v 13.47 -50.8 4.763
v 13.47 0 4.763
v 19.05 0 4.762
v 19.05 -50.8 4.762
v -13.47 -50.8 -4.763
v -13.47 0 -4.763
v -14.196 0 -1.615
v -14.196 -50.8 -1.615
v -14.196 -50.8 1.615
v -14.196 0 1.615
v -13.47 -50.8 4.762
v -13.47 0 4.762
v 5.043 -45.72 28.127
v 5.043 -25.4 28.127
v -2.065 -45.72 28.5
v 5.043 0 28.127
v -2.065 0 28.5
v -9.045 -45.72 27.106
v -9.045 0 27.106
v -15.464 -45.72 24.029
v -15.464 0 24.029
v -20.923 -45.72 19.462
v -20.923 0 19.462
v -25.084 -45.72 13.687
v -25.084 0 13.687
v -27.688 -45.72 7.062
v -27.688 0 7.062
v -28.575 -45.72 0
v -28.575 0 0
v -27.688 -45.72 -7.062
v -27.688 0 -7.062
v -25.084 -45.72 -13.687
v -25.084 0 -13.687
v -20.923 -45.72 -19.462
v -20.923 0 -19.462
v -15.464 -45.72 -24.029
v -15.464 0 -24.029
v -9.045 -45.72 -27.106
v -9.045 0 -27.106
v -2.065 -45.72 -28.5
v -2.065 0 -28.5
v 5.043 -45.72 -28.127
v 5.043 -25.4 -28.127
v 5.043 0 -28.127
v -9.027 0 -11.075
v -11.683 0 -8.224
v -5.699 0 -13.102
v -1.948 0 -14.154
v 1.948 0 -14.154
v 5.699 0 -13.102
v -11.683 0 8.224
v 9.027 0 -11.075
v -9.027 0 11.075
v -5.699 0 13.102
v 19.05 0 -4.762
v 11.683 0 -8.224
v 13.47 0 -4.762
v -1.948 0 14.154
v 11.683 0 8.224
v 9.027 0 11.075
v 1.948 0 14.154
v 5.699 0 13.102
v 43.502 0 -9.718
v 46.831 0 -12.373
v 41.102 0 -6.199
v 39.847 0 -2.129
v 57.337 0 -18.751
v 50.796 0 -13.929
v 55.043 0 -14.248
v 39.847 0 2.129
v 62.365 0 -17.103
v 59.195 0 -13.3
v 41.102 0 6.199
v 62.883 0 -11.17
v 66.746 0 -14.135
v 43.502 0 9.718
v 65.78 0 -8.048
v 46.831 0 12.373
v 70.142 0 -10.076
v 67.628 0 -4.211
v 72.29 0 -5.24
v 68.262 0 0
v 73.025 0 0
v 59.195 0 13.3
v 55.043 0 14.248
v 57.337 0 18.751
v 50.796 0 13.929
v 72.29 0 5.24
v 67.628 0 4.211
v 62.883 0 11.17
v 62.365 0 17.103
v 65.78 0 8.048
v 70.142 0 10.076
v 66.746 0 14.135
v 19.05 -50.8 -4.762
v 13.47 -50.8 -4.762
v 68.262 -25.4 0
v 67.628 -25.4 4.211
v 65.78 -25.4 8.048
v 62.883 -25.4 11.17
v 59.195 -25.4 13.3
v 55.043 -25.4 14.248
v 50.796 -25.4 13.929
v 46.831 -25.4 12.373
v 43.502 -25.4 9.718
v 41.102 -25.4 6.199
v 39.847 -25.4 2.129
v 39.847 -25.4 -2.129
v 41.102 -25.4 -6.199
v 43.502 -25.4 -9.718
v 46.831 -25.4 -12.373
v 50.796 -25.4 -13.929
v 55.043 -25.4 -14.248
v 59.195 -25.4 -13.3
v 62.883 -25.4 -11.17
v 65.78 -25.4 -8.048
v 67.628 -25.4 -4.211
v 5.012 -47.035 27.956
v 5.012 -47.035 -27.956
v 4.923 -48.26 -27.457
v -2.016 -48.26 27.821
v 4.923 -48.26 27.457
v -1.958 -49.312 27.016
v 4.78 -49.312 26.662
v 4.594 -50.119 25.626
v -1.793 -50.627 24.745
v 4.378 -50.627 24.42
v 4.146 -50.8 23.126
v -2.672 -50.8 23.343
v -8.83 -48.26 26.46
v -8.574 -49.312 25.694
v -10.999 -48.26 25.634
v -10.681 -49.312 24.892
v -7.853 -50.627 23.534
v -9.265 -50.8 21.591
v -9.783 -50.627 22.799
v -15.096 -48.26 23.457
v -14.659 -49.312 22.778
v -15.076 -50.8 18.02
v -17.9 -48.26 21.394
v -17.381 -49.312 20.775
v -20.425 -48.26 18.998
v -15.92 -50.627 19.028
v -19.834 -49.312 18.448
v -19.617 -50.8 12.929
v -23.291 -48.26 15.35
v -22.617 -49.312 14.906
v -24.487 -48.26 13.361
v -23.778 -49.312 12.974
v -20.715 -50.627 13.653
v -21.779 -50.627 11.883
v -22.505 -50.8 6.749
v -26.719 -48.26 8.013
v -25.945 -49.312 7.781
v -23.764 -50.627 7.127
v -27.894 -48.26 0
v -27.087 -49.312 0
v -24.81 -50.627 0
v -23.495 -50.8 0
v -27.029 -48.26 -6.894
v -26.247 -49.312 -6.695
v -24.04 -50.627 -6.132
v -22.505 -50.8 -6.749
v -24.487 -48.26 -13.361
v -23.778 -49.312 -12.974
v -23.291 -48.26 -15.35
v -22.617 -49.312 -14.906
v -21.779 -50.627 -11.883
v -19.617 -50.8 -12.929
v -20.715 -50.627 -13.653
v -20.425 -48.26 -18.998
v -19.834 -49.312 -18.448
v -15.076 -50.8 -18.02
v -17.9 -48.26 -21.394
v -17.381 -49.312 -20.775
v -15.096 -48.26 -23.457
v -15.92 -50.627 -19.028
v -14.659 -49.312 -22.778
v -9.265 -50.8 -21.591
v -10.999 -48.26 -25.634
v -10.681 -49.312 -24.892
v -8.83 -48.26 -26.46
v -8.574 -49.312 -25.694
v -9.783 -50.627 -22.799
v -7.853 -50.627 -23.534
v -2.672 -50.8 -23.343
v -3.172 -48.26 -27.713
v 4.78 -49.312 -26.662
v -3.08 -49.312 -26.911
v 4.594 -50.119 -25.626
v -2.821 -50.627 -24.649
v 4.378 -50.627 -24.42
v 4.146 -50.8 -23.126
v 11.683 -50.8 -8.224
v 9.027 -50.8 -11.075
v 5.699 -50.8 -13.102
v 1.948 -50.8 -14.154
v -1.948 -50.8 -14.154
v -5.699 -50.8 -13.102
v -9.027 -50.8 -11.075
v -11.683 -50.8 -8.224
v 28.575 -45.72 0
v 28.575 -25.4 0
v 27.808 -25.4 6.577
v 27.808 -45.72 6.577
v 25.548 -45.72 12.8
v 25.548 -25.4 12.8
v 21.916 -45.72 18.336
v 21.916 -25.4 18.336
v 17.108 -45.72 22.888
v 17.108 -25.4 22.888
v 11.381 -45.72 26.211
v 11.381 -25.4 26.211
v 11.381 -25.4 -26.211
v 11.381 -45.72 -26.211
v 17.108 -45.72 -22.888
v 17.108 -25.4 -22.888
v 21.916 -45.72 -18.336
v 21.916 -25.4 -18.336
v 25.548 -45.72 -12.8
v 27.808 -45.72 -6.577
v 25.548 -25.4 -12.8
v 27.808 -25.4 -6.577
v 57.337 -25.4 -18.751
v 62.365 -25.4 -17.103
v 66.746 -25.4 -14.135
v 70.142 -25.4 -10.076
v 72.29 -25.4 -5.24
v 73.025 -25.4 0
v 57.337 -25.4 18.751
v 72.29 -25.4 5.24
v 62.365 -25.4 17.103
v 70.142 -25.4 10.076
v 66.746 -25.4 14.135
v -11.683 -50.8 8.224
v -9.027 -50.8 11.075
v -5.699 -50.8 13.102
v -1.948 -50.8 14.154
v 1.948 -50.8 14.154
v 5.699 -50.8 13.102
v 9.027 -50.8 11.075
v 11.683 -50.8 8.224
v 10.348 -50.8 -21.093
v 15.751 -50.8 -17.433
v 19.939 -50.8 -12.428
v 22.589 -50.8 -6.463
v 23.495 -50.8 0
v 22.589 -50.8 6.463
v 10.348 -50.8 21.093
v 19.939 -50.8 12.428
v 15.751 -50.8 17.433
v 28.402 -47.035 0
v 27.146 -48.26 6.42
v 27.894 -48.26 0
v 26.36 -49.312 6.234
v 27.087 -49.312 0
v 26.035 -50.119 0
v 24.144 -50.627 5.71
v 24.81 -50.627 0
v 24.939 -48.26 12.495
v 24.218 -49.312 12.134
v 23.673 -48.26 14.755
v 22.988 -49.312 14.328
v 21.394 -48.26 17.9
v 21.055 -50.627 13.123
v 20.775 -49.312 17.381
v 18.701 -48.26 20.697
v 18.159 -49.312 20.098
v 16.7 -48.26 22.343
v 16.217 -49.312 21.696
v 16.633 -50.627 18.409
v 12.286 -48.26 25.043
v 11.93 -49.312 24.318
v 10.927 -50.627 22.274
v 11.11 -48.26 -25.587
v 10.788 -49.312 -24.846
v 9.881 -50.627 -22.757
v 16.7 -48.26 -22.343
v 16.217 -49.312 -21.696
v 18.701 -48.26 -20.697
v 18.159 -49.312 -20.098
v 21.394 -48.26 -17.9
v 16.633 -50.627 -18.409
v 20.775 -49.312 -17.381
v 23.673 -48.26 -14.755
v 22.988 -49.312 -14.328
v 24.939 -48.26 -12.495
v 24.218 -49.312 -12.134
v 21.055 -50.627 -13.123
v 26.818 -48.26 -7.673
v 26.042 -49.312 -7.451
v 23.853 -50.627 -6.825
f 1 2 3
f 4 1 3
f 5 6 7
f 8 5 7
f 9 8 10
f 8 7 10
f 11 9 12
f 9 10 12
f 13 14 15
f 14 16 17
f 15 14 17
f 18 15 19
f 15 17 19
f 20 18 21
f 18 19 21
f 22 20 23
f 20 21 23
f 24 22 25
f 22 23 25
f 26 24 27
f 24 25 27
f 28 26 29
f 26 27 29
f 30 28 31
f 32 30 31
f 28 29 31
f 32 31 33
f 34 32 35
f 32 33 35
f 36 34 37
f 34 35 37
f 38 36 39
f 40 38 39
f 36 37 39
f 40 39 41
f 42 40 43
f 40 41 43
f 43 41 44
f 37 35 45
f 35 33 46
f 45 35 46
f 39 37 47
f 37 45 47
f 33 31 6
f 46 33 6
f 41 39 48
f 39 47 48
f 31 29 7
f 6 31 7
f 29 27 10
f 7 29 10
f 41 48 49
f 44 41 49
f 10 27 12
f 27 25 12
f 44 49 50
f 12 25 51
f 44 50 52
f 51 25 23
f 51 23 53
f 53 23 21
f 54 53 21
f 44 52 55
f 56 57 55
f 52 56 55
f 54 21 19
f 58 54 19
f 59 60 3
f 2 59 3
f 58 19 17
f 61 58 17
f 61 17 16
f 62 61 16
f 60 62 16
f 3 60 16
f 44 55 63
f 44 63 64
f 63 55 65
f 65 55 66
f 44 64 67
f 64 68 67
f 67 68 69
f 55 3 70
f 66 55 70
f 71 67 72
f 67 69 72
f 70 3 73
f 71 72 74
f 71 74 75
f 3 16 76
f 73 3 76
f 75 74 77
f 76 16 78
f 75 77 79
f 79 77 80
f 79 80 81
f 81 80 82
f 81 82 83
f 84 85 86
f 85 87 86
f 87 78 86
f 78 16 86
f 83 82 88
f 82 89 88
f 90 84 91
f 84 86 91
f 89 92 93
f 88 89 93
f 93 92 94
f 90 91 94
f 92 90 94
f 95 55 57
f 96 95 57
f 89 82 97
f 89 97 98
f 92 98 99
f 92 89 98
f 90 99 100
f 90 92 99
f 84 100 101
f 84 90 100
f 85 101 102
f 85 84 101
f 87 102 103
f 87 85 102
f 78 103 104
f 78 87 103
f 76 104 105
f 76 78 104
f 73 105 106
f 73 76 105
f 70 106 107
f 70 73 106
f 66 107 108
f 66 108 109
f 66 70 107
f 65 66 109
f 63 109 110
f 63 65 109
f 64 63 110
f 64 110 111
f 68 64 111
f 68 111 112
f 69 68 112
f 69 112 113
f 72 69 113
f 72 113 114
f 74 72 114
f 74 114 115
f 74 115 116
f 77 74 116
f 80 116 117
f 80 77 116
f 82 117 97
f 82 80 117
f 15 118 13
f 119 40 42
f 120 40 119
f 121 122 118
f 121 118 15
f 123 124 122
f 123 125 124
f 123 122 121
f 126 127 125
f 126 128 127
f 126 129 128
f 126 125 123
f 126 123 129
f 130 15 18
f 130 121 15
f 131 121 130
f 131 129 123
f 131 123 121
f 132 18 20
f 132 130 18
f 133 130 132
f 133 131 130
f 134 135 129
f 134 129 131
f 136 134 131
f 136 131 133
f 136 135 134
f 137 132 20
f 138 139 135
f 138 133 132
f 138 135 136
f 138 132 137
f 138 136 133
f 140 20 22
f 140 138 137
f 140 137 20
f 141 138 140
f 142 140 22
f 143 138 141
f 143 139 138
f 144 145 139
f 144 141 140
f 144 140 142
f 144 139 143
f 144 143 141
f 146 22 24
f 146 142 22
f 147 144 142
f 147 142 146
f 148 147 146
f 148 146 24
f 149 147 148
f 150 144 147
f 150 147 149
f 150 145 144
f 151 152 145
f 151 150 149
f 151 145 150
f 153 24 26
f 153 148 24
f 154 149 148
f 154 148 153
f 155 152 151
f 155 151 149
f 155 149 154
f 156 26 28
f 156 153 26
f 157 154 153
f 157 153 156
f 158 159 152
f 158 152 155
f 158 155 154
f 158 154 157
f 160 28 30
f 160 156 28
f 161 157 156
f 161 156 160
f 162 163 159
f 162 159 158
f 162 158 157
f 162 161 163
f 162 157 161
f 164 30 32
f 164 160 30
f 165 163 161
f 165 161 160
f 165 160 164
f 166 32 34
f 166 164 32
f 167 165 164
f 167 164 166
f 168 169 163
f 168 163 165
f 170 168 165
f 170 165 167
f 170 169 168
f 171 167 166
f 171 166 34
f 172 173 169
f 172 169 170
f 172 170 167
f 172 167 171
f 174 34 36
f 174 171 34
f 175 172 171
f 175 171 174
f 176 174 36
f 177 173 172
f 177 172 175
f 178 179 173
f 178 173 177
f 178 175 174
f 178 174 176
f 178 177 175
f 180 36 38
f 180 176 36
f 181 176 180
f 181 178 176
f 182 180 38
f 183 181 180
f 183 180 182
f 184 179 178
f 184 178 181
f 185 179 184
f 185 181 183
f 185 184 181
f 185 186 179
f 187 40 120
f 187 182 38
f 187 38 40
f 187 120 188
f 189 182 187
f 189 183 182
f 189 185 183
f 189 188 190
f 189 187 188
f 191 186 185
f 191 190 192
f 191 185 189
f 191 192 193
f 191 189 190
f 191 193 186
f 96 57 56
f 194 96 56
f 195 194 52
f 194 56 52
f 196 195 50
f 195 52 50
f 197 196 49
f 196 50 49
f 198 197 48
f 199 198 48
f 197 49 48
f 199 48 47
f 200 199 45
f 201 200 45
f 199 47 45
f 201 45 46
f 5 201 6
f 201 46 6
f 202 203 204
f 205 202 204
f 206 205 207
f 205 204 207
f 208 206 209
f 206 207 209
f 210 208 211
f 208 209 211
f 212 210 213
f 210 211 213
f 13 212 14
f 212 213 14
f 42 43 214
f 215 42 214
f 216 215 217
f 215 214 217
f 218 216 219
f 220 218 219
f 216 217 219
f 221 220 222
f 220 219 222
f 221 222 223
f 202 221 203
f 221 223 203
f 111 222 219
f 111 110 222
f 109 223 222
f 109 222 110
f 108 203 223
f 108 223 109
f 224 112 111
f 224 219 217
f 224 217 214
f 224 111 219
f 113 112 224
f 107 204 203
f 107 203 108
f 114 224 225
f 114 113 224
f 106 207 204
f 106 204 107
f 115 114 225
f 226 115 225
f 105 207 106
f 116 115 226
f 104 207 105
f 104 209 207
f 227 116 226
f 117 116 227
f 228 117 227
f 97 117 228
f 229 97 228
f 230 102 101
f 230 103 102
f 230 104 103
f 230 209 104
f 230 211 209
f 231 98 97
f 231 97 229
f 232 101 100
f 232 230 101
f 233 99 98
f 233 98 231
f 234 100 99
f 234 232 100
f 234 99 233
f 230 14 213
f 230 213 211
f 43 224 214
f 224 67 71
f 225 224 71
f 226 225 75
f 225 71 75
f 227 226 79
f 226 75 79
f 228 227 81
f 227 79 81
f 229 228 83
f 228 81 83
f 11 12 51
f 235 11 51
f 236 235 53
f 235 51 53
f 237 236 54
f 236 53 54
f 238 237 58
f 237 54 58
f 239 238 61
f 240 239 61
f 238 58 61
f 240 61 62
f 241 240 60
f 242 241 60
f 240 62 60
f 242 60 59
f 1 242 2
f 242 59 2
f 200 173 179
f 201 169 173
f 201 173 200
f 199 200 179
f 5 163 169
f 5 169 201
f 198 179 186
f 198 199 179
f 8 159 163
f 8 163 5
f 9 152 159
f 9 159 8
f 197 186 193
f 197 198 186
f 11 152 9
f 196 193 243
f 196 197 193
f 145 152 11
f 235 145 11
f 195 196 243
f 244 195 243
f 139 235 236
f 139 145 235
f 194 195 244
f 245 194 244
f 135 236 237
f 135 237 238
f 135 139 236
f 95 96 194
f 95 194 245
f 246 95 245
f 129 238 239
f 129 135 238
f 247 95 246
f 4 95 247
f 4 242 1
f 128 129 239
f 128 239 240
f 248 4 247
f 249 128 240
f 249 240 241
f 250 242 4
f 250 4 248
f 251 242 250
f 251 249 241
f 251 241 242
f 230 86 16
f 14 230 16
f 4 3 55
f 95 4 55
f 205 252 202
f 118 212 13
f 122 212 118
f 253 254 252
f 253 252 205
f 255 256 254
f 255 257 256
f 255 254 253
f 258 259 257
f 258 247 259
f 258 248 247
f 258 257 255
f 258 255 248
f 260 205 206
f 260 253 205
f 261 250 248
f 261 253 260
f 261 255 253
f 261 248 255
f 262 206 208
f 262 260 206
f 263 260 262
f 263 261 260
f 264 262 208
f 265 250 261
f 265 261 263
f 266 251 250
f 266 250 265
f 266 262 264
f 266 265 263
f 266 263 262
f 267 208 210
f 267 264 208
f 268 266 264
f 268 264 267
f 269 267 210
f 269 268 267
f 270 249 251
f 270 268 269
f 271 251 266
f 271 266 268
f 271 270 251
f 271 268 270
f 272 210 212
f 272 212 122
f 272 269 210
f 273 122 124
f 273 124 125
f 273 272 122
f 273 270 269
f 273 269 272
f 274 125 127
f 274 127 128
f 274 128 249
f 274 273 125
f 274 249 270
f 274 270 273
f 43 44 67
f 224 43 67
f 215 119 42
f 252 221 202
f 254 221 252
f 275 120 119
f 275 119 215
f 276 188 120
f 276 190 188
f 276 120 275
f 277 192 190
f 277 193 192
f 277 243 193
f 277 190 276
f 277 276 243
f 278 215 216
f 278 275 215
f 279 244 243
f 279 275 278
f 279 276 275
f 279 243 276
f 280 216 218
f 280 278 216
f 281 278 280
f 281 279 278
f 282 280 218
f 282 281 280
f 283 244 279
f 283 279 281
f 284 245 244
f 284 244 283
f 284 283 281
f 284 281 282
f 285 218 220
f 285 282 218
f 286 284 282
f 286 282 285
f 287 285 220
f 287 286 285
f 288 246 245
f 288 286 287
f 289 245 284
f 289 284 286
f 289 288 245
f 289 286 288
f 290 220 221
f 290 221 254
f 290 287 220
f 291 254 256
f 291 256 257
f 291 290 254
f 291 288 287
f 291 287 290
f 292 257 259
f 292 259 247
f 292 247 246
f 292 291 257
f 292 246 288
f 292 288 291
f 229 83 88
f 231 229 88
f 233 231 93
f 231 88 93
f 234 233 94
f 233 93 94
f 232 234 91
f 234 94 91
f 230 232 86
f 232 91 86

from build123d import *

# Parameters (mm, degrees)
F0_R     = 14.2875
F1_DEPTH = 25.4
F2_DEPTH = 50.8
F3_R     = 5.08


with BuildPart() as f1:
    # F0 (on Front) → F1 (new body)
    with BuildSketch(Plane.XZ):
        with BuildLine():
            ThreePointArc((5.042647, -28.126541), (21.916025, -18.336262), (28.575, 0))
            ThreePointArc((28.575, 0), (21.916025, 18.336262), (5.042647, 28.126541))
            ThreePointArc((5.042647, 28.126541), (-28.575, 0), (5.042647, -28.126541))
        make_face()
        with BuildLine():
            ThreePointArc((-13.470384, 4.7625), (0, 14.2875), (13.470384, 4.7625))
            Line((13.470384, 4.7625), (19.05, 4.7625))
            Line((19.05, 4.7625), (19.05, -4.7625))
            Line((19.05, -4.7625), (13.470384, -4.7625))
            ThreePointArc((13.470384, -4.7625), (0, -14.2875), (-13.470384, -4.7625))
            Line((-13.470384, -4.7625), (-19.05, -4.7625))
            Line((-19.05, -4.7625), (-19.05, 4.7625))
            Line((-19.05, 4.7625), (-13.470384, 4.7625))
        make_face(mode=Mode.SUBTRACT)
        with BuildLine():
            ThreePointArc((-13.470384, -4.7625), (-14.2875, 0), (-13.470384, 4.7625))
            Line((-13.470384, 4.7625), (-19.05, 4.7625))
            Line((-19.05, 4.7625), (-19.05, -4.7625))
            Line((-19.05, -4.7625), (-13.470384, -4.7625))
        make_face()
        with BuildLine():
            ThreePointArc((5.042647, 28.126541), (21.916025, 18.336262), (28.575, 0))
            ThreePointArc((28.575, 0), (21.916025, -18.336262), (5.042647, -28.126541))
            Line((5.042647, -28.126541), (57.336765, -18.751028))
            ThreePointArc((57.336765, -18.751028), (34.925, 0), (57.336765, 18.751028))
            Line((57.336765, 18.751028), (5.042647, 28.126541))
        make_face()
        with BuildLine():
            ThreePointArc((73.025, 0), (68.585683, 12.224174), (57.336765, 18.751028))
            ThreePointArc((57.336765, 18.751028), (34.925, 0), (57.336765, -18.751028))
            ThreePointArc((57.336765, -18.751028), (68.585683, -12.224174), (73.025, 0))
        make_face()
        with Locations((53.975, 0)):
            Circle(F0_R, mode=Mode.SUBTRACT)
    extrude(amount=F1_DEPTH)

    # F0 (on Front) → F2 (join)
    with BuildSketch(Plane.XZ):
        with BuildLine():
            ThreePointArc((5.042647, -28.126541), (21.916025, -18.336262), (28.575, 0))
            ThreePointArc((28.575, 0), (21.916025, 18.336262), (5.042647, 28.126541))
            ThreePointArc((5.042647, 28.126541), (-28.575, 0), (5.042647, -28.126541))
        make_face()
        with BuildLine():
            ThreePointArc((-13.470384, 4.7625), (0, 14.2875), (13.470384, 4.7625))
            Line((13.470384, 4.7625), (19.05, 4.7625))
            Line((19.05, 4.7625), (19.05, -4.7625))
            Line((19.05, -4.7625), (13.470384, -4.7625))
            ThreePointArc((13.470384, -4.7625), (0, -14.2875), (-13.470384, -4.7625))
            Line((-13.470384, -4.7625), (-19.05, -4.7625))
            Line((-19.05, -4.7625), (-19.05, 4.7625))
            Line((-19.05, 4.7625), (-13.470384, 4.7625))
        make_face(mode=Mode.SUBTRACT)
        with BuildLine():
            ThreePointArc((-13.470384, -4.7625), (-14.2875, 0), (-13.470384, 4.7625))
            Line((-13.470384, 4.7625), (-19.05, 4.7625))
            Line((-19.05, 4.7625), (-19.05, -4.7625))
            Line((-19.05, -4.7625), (-13.470384, -4.7625))
        make_face()
    extrude(amount=F2_DEPTH)

    # F3
    f3_edges = [f1.edges().sort_by_distance(p)[0] for p in [
        (-5.042647, -50.8, 28.126541),
    ]]
    fillet(f3_edges, radius=F3_R)


solid = f1.part
